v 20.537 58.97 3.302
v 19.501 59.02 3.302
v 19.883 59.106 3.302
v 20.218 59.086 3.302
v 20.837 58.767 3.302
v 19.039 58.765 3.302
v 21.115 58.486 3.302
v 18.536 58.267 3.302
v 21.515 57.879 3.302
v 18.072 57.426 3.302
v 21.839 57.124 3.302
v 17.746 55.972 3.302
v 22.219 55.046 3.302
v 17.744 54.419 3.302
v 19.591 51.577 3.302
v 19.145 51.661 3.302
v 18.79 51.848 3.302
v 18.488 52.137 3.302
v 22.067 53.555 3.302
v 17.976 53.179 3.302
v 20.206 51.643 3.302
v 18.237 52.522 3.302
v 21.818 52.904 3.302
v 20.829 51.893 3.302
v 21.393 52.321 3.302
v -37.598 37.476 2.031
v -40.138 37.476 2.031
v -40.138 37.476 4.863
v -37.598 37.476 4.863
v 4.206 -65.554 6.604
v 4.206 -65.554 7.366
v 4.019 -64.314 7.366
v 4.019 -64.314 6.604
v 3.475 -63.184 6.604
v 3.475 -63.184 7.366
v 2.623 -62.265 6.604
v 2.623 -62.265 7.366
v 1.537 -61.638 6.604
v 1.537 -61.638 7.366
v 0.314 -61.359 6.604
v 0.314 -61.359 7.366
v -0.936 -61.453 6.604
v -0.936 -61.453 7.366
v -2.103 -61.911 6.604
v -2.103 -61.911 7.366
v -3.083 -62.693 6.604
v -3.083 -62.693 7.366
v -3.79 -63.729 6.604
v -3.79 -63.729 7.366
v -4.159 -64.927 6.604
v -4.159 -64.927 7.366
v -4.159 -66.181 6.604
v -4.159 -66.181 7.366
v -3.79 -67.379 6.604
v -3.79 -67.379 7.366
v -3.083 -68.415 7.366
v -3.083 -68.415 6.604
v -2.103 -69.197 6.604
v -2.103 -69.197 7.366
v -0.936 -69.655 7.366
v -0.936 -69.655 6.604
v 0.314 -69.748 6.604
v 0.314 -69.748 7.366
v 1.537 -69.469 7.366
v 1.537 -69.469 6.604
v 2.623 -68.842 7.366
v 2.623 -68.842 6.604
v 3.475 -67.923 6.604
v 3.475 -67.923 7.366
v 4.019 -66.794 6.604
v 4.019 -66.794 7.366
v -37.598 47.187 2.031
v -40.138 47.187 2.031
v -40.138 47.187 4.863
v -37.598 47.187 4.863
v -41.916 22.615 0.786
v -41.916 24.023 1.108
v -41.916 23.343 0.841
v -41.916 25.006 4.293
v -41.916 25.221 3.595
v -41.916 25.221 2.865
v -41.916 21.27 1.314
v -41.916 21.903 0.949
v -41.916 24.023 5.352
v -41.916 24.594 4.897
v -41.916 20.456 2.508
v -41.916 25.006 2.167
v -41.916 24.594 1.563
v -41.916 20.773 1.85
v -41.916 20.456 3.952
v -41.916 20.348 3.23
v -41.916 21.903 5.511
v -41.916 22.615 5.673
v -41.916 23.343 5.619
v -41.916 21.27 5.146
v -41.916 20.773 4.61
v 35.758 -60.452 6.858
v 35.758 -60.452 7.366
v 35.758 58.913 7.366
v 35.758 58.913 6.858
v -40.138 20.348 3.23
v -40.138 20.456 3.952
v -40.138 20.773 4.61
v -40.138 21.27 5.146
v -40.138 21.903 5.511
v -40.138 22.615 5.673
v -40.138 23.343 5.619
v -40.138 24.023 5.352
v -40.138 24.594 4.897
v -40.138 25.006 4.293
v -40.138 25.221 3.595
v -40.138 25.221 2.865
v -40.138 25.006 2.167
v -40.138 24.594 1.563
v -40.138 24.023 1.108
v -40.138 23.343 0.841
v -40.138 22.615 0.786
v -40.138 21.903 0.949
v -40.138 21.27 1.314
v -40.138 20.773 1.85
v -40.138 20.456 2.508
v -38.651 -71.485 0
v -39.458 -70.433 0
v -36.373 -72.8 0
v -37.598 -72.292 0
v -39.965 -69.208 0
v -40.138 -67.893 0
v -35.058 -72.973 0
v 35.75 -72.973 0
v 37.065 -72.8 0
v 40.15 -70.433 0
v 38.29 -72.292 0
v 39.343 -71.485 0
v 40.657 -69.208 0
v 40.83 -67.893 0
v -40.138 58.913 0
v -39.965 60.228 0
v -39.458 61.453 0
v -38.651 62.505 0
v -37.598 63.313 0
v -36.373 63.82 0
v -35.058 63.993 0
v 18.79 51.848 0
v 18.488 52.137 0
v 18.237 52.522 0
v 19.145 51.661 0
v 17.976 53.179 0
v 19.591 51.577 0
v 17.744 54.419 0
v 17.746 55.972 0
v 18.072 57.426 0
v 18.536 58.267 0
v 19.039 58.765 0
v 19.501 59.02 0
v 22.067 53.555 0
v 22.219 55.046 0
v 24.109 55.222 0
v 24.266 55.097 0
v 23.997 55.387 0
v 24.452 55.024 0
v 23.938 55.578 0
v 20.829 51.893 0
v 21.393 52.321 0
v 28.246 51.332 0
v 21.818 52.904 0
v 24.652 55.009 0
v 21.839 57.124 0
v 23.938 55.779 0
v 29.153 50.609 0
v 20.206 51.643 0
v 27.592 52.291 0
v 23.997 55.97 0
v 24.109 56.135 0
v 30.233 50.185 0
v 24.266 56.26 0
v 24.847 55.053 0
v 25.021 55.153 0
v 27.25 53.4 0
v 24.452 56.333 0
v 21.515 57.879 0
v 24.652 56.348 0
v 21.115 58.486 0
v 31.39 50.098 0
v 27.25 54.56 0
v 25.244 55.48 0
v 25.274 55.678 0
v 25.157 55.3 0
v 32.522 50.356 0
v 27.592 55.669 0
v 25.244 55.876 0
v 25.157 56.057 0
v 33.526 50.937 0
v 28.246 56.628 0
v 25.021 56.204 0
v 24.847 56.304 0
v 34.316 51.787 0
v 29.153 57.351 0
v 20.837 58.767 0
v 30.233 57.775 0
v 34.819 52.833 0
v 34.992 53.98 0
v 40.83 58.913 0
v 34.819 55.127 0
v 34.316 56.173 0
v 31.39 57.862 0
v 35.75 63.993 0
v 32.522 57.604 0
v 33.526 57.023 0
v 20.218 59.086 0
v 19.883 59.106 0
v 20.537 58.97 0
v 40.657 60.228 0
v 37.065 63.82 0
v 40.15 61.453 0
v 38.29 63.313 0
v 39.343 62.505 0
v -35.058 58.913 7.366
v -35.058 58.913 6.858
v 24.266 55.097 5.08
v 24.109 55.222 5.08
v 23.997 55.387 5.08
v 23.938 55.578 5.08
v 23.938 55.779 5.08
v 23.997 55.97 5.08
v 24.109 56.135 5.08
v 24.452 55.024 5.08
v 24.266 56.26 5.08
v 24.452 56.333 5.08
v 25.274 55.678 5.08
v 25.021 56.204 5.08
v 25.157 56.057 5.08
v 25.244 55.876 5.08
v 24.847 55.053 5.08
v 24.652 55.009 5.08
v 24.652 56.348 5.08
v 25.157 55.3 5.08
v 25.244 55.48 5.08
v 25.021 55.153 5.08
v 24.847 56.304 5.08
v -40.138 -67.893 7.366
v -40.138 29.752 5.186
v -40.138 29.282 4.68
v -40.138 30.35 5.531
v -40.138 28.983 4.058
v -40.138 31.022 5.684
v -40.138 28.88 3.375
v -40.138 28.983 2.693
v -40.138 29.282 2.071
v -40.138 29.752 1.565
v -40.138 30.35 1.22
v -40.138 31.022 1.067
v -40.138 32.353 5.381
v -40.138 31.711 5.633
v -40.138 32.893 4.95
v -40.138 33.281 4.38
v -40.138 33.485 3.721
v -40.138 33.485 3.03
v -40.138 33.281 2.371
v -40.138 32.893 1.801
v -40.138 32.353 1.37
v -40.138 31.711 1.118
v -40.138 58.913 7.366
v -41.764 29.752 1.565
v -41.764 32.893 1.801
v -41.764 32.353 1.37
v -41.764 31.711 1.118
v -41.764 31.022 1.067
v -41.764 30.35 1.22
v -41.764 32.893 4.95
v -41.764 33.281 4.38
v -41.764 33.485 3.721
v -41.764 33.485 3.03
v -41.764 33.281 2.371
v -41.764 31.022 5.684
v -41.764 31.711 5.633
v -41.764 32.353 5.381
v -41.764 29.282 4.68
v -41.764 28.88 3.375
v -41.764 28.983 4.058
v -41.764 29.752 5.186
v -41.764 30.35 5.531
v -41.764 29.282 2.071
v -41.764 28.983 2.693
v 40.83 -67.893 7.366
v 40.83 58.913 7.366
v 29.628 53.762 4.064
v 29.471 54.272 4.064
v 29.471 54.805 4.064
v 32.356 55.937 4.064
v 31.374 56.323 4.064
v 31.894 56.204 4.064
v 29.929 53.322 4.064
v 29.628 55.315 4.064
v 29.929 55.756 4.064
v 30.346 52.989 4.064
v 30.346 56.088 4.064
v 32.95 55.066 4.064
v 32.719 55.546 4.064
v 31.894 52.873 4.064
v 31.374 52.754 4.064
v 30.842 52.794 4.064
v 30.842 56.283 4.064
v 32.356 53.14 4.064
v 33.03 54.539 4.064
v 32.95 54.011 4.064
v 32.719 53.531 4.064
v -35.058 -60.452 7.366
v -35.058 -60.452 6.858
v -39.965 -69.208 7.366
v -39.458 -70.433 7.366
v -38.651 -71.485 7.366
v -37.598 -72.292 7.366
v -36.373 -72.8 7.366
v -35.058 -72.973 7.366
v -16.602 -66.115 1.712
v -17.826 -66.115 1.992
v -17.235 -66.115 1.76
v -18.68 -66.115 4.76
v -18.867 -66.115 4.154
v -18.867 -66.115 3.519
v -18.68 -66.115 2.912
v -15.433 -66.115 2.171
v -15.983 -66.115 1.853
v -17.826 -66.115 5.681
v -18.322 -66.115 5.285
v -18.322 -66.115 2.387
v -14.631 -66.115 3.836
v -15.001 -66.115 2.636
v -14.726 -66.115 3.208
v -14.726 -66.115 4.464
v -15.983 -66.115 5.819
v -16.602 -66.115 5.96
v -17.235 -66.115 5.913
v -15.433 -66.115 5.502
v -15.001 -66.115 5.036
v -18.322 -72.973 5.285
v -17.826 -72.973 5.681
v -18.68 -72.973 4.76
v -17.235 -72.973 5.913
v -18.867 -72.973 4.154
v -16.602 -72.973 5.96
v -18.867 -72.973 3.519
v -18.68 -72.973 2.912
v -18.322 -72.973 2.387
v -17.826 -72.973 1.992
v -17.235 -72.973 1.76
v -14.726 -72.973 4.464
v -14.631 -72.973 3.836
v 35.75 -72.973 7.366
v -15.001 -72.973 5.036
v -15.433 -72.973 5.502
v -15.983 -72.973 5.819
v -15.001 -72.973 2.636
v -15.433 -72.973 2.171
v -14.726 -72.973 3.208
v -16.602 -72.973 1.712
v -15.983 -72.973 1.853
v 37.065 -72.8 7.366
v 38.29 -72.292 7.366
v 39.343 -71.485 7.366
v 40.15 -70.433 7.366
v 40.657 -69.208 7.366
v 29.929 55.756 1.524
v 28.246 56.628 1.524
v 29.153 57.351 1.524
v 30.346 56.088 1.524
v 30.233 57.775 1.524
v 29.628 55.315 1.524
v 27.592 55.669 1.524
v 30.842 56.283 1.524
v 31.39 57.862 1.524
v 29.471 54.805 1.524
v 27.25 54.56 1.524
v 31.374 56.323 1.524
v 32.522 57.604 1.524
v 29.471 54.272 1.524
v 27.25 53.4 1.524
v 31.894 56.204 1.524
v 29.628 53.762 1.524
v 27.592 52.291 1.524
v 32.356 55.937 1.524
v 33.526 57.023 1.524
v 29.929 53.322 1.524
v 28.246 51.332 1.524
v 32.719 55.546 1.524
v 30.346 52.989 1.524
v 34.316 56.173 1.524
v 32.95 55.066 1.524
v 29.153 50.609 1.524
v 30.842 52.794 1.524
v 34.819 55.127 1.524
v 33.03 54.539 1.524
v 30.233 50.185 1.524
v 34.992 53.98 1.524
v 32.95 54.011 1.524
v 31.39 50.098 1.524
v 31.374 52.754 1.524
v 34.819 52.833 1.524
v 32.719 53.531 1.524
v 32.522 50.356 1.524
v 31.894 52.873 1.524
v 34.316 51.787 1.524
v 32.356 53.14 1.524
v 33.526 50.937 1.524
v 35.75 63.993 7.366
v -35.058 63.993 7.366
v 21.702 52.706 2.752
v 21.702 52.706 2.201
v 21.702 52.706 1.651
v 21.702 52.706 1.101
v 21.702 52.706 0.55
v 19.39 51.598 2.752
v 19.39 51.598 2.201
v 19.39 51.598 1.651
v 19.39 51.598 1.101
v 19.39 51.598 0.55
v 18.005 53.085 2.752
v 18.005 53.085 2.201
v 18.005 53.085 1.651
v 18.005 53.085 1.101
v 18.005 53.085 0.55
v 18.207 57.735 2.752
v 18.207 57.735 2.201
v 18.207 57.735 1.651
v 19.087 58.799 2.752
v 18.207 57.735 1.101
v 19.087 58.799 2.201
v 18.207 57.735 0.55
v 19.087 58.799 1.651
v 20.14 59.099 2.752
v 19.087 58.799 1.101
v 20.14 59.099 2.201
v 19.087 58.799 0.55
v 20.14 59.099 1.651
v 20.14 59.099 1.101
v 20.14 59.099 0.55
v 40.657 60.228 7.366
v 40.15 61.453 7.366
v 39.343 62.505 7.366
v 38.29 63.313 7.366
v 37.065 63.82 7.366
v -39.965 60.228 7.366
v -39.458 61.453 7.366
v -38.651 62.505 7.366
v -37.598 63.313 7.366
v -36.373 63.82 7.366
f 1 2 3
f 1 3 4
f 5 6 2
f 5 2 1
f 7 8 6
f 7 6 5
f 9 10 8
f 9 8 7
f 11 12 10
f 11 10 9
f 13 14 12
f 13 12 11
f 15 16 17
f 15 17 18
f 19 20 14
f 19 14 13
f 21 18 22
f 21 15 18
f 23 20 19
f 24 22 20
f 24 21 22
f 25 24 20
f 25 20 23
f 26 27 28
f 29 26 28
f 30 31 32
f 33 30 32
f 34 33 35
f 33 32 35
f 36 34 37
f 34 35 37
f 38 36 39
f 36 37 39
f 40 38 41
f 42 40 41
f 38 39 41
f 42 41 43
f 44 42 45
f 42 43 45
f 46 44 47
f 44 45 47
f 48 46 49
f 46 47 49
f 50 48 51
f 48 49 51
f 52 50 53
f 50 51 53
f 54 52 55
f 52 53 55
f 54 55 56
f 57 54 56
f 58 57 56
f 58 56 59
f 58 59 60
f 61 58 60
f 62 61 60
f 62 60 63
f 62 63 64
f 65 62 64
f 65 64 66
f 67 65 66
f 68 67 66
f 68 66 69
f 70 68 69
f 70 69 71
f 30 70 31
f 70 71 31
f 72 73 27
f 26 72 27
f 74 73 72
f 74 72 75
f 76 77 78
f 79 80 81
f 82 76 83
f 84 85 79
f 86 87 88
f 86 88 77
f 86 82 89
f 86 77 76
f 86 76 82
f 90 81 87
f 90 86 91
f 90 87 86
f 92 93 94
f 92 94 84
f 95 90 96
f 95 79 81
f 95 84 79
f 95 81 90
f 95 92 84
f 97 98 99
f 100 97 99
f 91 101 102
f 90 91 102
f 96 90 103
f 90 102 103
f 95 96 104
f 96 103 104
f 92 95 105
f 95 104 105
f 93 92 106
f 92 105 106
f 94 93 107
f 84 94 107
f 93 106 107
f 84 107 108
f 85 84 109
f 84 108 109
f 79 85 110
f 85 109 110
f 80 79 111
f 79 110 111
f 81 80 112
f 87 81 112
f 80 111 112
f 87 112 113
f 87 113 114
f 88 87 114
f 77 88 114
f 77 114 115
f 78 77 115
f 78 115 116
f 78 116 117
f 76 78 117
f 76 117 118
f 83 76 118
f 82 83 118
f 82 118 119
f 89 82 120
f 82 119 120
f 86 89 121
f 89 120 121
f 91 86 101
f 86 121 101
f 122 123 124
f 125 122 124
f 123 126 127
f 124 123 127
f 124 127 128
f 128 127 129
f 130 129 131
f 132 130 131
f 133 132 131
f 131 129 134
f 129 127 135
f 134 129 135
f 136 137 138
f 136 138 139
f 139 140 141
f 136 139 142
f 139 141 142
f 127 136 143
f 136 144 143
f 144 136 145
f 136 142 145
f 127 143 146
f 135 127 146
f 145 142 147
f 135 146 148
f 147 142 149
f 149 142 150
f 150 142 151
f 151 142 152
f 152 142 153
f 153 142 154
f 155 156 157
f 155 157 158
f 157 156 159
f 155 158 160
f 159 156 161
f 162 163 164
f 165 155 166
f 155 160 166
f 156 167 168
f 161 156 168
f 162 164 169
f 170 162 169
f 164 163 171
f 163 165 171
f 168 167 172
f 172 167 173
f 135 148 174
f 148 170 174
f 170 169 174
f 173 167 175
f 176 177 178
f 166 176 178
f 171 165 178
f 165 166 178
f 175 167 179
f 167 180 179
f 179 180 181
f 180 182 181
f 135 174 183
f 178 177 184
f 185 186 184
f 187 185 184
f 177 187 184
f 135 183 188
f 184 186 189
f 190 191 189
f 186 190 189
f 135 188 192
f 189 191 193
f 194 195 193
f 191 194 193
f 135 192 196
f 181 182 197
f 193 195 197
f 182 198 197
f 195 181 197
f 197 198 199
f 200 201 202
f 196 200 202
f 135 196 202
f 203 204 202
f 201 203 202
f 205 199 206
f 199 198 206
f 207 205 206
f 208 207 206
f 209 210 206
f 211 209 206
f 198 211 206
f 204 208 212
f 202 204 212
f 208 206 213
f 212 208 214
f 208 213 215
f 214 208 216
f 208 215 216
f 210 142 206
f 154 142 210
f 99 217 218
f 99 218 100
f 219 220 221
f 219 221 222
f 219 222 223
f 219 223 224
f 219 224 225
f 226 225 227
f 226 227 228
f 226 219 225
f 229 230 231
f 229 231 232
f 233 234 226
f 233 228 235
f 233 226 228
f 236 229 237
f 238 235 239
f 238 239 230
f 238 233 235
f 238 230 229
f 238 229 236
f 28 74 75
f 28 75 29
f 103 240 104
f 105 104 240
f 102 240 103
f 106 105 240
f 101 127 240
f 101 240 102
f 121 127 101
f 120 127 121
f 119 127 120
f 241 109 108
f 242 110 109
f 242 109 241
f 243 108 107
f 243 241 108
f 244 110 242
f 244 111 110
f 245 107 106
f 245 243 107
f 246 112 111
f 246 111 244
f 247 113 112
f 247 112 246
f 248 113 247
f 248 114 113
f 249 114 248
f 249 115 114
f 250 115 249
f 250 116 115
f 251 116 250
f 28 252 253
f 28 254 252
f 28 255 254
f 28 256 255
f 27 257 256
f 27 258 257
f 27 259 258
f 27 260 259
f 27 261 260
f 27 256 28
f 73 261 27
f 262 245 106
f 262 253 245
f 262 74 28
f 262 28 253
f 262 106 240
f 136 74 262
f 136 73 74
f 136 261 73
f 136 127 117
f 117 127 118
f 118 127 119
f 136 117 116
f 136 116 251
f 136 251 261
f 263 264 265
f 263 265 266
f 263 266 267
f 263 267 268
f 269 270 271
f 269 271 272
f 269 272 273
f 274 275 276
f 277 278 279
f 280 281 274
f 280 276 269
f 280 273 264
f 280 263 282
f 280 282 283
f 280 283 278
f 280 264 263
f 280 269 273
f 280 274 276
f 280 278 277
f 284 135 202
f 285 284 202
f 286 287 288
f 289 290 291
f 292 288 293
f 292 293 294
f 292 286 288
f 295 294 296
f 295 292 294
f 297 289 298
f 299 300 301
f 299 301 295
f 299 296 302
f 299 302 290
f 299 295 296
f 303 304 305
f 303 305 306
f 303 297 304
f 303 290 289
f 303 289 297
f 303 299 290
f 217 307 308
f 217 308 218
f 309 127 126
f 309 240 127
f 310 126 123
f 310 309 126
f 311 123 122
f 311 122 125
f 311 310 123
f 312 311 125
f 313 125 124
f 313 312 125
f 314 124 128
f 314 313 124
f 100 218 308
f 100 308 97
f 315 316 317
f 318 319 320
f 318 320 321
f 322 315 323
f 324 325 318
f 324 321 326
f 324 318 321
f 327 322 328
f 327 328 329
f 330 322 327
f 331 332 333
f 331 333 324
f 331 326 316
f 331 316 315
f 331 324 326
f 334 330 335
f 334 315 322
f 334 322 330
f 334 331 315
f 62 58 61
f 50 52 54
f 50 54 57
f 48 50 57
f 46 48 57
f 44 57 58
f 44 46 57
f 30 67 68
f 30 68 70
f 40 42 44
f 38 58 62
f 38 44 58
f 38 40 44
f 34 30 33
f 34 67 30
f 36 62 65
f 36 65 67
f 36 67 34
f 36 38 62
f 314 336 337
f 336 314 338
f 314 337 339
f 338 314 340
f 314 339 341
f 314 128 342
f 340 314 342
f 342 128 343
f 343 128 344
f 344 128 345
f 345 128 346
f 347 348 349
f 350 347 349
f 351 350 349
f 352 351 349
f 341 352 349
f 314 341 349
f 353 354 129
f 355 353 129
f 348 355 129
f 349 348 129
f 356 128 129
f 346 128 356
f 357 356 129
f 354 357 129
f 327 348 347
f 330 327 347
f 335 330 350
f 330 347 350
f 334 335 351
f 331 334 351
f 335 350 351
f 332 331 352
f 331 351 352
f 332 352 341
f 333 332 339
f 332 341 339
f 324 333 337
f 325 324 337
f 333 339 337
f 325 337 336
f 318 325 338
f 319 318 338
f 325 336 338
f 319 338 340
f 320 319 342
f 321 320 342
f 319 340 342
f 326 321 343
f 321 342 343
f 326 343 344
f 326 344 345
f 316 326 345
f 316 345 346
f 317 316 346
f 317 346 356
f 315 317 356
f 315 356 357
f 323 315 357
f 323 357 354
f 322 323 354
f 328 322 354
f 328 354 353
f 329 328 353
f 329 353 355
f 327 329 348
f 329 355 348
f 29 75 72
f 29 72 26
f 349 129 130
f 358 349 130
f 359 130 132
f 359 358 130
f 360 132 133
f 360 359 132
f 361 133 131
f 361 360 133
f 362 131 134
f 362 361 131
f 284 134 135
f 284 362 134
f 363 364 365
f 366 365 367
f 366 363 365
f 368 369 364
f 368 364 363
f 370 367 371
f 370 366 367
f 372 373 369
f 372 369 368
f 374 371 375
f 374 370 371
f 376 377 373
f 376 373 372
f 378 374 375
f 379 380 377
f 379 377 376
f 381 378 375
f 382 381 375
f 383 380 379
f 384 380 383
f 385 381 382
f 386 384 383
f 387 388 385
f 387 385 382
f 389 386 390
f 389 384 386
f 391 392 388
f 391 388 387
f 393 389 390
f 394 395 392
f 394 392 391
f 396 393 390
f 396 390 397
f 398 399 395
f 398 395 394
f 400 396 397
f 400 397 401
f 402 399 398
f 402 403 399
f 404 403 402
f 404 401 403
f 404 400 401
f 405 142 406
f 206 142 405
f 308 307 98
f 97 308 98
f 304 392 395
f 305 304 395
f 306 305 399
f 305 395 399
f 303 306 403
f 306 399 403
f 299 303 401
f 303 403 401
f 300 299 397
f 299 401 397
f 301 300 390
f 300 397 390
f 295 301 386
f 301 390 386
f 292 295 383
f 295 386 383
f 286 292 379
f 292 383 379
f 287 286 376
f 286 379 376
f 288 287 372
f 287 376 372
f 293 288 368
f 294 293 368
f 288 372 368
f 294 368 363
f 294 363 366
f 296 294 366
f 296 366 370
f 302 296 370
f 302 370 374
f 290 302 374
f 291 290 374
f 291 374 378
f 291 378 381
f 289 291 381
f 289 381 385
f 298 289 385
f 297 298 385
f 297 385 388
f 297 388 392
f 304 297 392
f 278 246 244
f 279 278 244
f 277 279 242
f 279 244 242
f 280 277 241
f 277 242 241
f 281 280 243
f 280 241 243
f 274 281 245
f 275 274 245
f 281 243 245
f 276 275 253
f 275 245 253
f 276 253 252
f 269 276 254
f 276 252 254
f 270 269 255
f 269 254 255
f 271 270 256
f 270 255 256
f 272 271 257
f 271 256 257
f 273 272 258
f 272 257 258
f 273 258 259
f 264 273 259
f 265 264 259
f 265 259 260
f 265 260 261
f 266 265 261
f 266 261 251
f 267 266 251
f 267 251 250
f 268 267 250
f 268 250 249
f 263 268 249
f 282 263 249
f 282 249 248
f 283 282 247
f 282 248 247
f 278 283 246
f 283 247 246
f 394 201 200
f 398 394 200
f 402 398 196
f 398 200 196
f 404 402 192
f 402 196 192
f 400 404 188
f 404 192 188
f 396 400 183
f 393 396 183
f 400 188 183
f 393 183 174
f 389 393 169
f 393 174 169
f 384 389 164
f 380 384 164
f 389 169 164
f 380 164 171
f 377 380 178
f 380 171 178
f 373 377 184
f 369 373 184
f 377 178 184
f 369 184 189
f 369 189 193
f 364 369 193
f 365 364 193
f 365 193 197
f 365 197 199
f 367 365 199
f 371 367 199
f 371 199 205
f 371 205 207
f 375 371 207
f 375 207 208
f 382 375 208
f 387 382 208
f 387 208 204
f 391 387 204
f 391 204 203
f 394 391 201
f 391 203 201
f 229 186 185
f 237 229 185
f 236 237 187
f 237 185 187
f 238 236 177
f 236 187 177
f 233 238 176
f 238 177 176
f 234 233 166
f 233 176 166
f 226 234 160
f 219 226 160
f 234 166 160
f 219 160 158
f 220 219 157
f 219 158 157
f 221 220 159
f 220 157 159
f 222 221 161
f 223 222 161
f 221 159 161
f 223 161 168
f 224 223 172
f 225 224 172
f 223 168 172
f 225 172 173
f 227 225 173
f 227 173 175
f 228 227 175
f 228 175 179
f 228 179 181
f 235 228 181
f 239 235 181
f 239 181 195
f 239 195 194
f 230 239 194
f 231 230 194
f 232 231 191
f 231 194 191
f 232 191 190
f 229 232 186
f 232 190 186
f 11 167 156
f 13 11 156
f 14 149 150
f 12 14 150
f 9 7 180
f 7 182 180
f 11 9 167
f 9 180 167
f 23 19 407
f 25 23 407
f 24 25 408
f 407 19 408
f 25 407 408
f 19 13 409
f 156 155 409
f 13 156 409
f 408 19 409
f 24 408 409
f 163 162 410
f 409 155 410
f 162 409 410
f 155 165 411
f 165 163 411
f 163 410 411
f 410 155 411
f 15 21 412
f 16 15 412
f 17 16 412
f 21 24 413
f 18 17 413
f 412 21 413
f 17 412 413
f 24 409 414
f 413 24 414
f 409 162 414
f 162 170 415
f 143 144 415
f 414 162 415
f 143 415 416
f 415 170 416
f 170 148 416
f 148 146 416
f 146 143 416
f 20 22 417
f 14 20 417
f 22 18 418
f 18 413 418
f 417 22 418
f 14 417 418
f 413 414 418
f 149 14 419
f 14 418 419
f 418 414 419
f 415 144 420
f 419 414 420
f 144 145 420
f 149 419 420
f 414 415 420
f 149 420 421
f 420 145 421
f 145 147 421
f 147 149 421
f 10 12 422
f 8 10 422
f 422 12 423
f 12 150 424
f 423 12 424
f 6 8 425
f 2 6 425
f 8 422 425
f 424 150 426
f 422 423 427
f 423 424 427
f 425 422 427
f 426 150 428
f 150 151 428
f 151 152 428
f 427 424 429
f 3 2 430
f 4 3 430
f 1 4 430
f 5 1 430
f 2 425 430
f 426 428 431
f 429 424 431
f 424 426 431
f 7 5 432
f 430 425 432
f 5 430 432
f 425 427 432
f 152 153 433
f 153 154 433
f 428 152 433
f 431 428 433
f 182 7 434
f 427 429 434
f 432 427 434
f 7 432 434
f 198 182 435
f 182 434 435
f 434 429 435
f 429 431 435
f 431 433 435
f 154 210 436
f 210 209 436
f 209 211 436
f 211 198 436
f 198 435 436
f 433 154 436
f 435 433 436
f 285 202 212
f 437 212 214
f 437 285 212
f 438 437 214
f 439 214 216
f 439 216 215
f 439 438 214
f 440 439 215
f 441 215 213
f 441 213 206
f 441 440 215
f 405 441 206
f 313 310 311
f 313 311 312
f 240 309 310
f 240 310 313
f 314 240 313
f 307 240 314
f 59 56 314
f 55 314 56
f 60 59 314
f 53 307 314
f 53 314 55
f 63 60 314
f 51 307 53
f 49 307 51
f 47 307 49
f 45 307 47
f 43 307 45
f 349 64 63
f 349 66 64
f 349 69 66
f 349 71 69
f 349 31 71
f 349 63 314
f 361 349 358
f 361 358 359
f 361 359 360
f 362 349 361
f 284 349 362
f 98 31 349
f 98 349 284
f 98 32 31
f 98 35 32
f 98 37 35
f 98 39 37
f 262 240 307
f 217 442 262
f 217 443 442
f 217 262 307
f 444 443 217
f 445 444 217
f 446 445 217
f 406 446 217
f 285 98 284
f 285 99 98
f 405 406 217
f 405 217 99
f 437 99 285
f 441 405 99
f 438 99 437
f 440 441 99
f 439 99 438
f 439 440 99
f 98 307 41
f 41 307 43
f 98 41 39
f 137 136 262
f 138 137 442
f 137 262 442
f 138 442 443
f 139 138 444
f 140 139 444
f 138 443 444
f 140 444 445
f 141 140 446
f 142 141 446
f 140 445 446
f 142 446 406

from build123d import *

# Parameters (mm, degrees)
F0_W      = 80.9689760208
F0_H      = 136.9662135839
F1_DEPTH  = 7.366
F2_R      = 5.08
F3_W      = 70.8160358799
F3_H      = 119.3651366365
F4_DEPTH  = 0.508
F5_R      = 4.2062537649
F6_DEPTH  = 0.762
F7_W      = 9.7111202776
F7_H      = 2.8320385609
F8_DEPTH  = 2.54
F9_R      = 2.3153657449
F10_DEPTH = 1.6256
F11_R     = 2.4503430009
F12_DEPTH = 1.778
F14_R     = 3.8927406251
F15_DEPTH = 1.524
F16_R     = 1.7892494252
F17_DEPTH = 4.064
F18_R     = 0.6717284453
F19_DEPTH = 5.08
F21_DEPTH = 3.302
F22_R     = 2.1300534038
F23_DEPTH = 6.858


with BuildPart() as f1:
    # F0 (on Top) → F1 (new body)
    with BuildSketch(Plane.XY):
        with Locations((0.3460086882, -4.4899731874)):
            Rectangle(F0_W, F0_H)
    extrude(amount=F1_DEPTH)

    # F2
    f2_edges = [f1.edges().sort_by_distance(p)[0] for p in [
        (-40.138479, 63.993134, 3.683),
        (40.830497, 63.993134, 3.683),
        (40.830497, -72.97308, 3.683),
        (-40.138479, -72.97308, 3.683),
    ]]
    fillet(f2_edges, radius=F2_R)

    # F3 (on face) → F4 (cut)
    with BuildSketch(Plane.XY.offset(7.366)):
        with Locations((0.3495386177, -0.7694347137)):
            Rectangle(F3_W, F3_H)
    extrude(amount=-F4_DEPTH, mode=Mode.SUBTRACT)

    # F5 (on face) → F6 (cut)
    with BuildSketch(Plane.XY.offset(7.366)):
        with Locations((0, -65.5538588762)):
            Circle(F5_R)
    extrude(amount=-F6_DEPTH, mode=Mode.SUBTRACT)

    # F7 (on face) → F8 (cut)
    with BuildSketch(Plane(origin=(-40.1384793222, 0, 0), x_dir=(0, -1, 0), z_dir=(-1, 0, 0))):
        with Locations((-42.3318911344, 3.4466114594)):
            Rectangle(F7_W, F7_H)
    extrude(amount=-F8_DEPTH, mode=Mode.SUBTRACT)

    # F9 (on face) → F10 (join)
    with BuildSketch(Plane(origin=(-40.1384793222, 0, 0), x_dir=(0, -1, 0), z_dir=(-1, 0, 0))):
        with Locations((-31.1954244971, 3.375432454)):
            Circle(F9_R)
    extrude(amount=F10_DEPTH)

    # F11 (on face) → F12 (join)
    with BuildSketch(Plane(origin=(-40.1384793222, 0, 0), x_dir=(0, -1, 0), z_dir=(-1, 0, 0))):
        with Locations((-22.7978900075, 3.2298590522)):
            Circle(F11_R)
    extrude(amount=F12_DEPTH)

    # F14 (on face) → F15 (cut)
    with BuildSketch(Plane(origin=(0, 0, 0), x_dir=(1, 0, 0), z_dir=(0, 0, -1))):
        with Locations((31.0994051397, -53.9800077677)):
            Circle(F14_R)
    extrude(amount=-F15_DEPTH, mode=Mode.SUBTRACT)

    # F16 (on face) → F17 (cut)
    with BuildSketch(Plane(origin=(0, 0, 0), x_dir=(1, 0, 0), z_dir=(0, 0, -1))):
        with Locations((31.2404166907, -54.5385442674)):
            Circle(F16_R)
    extrude(amount=-F17_DEPTH, mode=Mode.SUBTRACT)

    # F18 (on face) → F19 (cut)
    with BuildSketch(Plane(origin=(0, 0, 0), x_dir=(1, 0, 0), z_dir=(0, 0, -1))):
        with Locations((24.6018432081, -55.6784830987)):
            Circle(F18_R)
    extrude(amount=-F19_DEPTH, mode=Mode.SUBTRACT)

    # F20 (on face) → F21 (cut)
    with BuildSketch(Plane(origin=(0, 0, 0), x_dir=(1, 0, 0), z_dir=(0, 0, -1))):
        with BuildLine():
            add(Edge.make_bspline(
                [(21.838599816, -57.1239739656), (22.3255501081, -55.7146974508), (22.4935564689, -52.3704464682), (19.2282519734, -51.1257918433), (17.6040761183, -53.0174394253), (17.5519956723, -57.9087722175), (20.2838683925, -59.75590869), (21.4647452863, -58.2059415034), (21.838599816, -57.1239739656)],
                knots=[0, 0, 0, 0, 0.2013997834, 0.354787719, 0.491355532, 0.6980279839, 0.8453759603, 1, 1, 1, 1], degree=3))
        make_face()
    extrude(amount=-F21_DEPTH, mode=Mode.SUBTRACT)

    # F22 (on face) → F23 (cut)
    with BuildSketch(Plane.XZ.offset(72.9730799794)):
        with Locations((-16.7610161006, 3.8362841588)):
            Circle(F22_R)
    extrude(amount=-F23_DEPTH, mode=Mode.SUBTRACT)


solid = f1.part
